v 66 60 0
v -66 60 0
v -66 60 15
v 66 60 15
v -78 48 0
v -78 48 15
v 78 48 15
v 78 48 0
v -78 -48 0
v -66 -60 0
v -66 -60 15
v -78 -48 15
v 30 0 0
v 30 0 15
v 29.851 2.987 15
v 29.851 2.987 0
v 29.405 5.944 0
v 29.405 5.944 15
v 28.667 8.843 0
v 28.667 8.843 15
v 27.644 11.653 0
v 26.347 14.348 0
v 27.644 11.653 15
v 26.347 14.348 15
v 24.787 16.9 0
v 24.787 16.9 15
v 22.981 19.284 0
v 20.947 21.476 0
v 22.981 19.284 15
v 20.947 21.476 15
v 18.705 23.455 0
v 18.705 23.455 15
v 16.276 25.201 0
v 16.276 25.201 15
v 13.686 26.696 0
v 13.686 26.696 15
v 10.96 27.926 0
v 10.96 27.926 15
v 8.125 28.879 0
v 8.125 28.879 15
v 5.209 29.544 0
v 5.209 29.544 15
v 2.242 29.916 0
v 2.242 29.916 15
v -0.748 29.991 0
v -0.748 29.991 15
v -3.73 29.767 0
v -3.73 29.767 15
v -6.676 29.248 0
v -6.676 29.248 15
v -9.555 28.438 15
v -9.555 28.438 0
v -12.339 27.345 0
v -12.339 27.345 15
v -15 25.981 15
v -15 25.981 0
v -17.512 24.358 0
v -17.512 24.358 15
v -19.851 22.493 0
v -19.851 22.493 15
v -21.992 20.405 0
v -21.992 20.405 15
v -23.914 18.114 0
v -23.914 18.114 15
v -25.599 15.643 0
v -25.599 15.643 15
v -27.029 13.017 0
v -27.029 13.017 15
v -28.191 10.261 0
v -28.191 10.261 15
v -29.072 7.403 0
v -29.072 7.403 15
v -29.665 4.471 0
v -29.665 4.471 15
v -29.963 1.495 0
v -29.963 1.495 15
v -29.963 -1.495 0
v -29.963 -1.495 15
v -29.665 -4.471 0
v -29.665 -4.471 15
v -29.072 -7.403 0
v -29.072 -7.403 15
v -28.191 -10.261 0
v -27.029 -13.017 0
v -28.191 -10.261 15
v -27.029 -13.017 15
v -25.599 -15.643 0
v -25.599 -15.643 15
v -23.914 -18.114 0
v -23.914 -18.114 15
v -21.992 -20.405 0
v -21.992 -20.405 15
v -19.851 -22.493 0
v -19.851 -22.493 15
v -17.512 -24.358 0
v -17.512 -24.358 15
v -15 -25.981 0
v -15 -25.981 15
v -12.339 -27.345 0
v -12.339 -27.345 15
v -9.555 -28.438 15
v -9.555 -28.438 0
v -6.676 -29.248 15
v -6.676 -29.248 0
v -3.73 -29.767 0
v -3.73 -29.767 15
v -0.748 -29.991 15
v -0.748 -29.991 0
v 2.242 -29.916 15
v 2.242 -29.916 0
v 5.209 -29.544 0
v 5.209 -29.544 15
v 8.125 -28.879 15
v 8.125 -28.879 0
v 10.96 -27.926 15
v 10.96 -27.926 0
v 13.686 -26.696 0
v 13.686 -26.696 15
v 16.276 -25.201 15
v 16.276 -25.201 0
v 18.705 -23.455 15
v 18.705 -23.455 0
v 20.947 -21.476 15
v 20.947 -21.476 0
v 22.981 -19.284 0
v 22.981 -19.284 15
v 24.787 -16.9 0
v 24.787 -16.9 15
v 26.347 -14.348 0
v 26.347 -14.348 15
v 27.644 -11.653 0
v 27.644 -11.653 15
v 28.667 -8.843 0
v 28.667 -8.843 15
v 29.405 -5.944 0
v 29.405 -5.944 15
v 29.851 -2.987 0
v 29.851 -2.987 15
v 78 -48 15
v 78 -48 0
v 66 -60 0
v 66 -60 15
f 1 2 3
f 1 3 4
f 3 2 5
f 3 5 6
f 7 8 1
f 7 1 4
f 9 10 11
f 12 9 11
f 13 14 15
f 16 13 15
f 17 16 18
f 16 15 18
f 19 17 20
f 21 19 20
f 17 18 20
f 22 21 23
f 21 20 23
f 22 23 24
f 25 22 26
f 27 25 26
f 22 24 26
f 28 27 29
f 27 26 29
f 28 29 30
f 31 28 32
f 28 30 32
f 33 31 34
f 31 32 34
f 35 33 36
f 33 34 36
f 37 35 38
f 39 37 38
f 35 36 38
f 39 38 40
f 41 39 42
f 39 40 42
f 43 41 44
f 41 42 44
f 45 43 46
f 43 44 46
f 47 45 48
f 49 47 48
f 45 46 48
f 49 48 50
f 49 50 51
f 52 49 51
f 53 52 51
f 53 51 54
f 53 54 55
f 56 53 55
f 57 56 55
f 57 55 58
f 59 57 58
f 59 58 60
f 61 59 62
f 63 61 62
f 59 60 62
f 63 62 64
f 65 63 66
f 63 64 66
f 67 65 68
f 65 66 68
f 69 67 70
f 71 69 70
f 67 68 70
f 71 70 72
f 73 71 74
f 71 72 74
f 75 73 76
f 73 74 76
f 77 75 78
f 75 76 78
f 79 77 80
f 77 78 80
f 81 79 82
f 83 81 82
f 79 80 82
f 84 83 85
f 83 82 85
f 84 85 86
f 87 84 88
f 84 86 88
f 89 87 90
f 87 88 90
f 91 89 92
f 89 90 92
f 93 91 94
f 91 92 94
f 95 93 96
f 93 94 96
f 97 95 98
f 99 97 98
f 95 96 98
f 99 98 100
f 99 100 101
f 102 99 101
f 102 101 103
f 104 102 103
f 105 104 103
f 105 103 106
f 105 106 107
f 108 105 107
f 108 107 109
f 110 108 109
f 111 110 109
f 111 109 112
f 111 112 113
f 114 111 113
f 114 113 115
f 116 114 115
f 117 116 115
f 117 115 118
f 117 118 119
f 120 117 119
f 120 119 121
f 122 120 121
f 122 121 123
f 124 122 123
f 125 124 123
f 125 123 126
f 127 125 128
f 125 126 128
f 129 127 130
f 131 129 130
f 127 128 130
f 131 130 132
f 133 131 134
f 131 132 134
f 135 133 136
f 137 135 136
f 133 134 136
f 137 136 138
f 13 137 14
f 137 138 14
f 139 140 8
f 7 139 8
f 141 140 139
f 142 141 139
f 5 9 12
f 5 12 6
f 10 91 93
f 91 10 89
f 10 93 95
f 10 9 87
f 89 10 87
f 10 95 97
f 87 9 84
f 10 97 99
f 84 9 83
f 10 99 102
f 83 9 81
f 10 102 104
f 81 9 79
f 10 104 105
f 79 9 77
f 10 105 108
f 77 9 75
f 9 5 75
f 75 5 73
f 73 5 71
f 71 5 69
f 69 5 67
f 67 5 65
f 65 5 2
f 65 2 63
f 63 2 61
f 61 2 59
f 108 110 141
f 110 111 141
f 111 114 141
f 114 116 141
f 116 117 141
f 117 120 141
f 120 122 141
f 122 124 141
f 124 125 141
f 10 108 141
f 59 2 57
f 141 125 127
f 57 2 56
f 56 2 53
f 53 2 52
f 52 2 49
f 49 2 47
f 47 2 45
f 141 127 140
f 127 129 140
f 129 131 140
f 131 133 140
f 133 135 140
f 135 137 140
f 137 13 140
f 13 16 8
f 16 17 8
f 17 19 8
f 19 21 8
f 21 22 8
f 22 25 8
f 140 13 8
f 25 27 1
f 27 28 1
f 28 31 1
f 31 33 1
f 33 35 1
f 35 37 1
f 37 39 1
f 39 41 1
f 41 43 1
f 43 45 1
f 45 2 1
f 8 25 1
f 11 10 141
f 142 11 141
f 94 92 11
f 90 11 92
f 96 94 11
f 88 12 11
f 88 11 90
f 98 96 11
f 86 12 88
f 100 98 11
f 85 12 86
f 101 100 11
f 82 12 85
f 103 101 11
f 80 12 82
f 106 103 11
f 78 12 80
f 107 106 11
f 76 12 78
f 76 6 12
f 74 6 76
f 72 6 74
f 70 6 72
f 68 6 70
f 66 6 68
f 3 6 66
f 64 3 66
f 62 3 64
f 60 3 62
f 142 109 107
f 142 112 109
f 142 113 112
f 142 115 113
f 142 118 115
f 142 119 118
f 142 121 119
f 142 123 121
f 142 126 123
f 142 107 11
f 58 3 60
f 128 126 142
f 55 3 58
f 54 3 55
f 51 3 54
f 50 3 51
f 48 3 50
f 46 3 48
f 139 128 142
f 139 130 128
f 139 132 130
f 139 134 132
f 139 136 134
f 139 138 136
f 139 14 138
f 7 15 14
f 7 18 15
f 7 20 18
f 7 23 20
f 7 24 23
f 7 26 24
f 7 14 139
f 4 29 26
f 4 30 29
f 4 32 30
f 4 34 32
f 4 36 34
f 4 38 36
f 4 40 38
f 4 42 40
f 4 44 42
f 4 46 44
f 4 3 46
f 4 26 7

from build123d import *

# Parameters (mm, degrees)
SKETCH1_W           = 156
SKETCH1_H           = 120
BOSS_EXTRUDE1_DEPTH = 15
SKETCH2_R           = 30
CUT_EXTRUDE1_DEPTH  = 15
CHAMFER1_SIZE       = 12


with BuildPart() as part:
    # Sketch1 → Boss-Extrude1 (new body)
    with BuildSketch(Plane.XY):
        Rectangle(SKETCH1_W, SKETCH1_H)
    extrude(amount=BOSS_EXTRUDE1_DEPTH)

    # Sketch2 → Cut-Extrude1 (cut)
    with BuildSketch(Plane.XY.offset(15)):
        Circle(SKETCH2_R)
    extrude(amount=-CUT_EXTRUDE1_DEPTH, mode=Mode.SUBTRACT)

    # Chamfer1
    chamfer1_edges = [part.edges().sort_by_distance(p)[0] for p in [
        (78, -60, 7.5),
        (-78, -60, 7.5),
        (-78, 60, 7.5),
        (78, 60, 7.5),
    ]]
    chamfer(chamfer1_edges, length=CHAMFER1_SIZE)


solid = part.part
